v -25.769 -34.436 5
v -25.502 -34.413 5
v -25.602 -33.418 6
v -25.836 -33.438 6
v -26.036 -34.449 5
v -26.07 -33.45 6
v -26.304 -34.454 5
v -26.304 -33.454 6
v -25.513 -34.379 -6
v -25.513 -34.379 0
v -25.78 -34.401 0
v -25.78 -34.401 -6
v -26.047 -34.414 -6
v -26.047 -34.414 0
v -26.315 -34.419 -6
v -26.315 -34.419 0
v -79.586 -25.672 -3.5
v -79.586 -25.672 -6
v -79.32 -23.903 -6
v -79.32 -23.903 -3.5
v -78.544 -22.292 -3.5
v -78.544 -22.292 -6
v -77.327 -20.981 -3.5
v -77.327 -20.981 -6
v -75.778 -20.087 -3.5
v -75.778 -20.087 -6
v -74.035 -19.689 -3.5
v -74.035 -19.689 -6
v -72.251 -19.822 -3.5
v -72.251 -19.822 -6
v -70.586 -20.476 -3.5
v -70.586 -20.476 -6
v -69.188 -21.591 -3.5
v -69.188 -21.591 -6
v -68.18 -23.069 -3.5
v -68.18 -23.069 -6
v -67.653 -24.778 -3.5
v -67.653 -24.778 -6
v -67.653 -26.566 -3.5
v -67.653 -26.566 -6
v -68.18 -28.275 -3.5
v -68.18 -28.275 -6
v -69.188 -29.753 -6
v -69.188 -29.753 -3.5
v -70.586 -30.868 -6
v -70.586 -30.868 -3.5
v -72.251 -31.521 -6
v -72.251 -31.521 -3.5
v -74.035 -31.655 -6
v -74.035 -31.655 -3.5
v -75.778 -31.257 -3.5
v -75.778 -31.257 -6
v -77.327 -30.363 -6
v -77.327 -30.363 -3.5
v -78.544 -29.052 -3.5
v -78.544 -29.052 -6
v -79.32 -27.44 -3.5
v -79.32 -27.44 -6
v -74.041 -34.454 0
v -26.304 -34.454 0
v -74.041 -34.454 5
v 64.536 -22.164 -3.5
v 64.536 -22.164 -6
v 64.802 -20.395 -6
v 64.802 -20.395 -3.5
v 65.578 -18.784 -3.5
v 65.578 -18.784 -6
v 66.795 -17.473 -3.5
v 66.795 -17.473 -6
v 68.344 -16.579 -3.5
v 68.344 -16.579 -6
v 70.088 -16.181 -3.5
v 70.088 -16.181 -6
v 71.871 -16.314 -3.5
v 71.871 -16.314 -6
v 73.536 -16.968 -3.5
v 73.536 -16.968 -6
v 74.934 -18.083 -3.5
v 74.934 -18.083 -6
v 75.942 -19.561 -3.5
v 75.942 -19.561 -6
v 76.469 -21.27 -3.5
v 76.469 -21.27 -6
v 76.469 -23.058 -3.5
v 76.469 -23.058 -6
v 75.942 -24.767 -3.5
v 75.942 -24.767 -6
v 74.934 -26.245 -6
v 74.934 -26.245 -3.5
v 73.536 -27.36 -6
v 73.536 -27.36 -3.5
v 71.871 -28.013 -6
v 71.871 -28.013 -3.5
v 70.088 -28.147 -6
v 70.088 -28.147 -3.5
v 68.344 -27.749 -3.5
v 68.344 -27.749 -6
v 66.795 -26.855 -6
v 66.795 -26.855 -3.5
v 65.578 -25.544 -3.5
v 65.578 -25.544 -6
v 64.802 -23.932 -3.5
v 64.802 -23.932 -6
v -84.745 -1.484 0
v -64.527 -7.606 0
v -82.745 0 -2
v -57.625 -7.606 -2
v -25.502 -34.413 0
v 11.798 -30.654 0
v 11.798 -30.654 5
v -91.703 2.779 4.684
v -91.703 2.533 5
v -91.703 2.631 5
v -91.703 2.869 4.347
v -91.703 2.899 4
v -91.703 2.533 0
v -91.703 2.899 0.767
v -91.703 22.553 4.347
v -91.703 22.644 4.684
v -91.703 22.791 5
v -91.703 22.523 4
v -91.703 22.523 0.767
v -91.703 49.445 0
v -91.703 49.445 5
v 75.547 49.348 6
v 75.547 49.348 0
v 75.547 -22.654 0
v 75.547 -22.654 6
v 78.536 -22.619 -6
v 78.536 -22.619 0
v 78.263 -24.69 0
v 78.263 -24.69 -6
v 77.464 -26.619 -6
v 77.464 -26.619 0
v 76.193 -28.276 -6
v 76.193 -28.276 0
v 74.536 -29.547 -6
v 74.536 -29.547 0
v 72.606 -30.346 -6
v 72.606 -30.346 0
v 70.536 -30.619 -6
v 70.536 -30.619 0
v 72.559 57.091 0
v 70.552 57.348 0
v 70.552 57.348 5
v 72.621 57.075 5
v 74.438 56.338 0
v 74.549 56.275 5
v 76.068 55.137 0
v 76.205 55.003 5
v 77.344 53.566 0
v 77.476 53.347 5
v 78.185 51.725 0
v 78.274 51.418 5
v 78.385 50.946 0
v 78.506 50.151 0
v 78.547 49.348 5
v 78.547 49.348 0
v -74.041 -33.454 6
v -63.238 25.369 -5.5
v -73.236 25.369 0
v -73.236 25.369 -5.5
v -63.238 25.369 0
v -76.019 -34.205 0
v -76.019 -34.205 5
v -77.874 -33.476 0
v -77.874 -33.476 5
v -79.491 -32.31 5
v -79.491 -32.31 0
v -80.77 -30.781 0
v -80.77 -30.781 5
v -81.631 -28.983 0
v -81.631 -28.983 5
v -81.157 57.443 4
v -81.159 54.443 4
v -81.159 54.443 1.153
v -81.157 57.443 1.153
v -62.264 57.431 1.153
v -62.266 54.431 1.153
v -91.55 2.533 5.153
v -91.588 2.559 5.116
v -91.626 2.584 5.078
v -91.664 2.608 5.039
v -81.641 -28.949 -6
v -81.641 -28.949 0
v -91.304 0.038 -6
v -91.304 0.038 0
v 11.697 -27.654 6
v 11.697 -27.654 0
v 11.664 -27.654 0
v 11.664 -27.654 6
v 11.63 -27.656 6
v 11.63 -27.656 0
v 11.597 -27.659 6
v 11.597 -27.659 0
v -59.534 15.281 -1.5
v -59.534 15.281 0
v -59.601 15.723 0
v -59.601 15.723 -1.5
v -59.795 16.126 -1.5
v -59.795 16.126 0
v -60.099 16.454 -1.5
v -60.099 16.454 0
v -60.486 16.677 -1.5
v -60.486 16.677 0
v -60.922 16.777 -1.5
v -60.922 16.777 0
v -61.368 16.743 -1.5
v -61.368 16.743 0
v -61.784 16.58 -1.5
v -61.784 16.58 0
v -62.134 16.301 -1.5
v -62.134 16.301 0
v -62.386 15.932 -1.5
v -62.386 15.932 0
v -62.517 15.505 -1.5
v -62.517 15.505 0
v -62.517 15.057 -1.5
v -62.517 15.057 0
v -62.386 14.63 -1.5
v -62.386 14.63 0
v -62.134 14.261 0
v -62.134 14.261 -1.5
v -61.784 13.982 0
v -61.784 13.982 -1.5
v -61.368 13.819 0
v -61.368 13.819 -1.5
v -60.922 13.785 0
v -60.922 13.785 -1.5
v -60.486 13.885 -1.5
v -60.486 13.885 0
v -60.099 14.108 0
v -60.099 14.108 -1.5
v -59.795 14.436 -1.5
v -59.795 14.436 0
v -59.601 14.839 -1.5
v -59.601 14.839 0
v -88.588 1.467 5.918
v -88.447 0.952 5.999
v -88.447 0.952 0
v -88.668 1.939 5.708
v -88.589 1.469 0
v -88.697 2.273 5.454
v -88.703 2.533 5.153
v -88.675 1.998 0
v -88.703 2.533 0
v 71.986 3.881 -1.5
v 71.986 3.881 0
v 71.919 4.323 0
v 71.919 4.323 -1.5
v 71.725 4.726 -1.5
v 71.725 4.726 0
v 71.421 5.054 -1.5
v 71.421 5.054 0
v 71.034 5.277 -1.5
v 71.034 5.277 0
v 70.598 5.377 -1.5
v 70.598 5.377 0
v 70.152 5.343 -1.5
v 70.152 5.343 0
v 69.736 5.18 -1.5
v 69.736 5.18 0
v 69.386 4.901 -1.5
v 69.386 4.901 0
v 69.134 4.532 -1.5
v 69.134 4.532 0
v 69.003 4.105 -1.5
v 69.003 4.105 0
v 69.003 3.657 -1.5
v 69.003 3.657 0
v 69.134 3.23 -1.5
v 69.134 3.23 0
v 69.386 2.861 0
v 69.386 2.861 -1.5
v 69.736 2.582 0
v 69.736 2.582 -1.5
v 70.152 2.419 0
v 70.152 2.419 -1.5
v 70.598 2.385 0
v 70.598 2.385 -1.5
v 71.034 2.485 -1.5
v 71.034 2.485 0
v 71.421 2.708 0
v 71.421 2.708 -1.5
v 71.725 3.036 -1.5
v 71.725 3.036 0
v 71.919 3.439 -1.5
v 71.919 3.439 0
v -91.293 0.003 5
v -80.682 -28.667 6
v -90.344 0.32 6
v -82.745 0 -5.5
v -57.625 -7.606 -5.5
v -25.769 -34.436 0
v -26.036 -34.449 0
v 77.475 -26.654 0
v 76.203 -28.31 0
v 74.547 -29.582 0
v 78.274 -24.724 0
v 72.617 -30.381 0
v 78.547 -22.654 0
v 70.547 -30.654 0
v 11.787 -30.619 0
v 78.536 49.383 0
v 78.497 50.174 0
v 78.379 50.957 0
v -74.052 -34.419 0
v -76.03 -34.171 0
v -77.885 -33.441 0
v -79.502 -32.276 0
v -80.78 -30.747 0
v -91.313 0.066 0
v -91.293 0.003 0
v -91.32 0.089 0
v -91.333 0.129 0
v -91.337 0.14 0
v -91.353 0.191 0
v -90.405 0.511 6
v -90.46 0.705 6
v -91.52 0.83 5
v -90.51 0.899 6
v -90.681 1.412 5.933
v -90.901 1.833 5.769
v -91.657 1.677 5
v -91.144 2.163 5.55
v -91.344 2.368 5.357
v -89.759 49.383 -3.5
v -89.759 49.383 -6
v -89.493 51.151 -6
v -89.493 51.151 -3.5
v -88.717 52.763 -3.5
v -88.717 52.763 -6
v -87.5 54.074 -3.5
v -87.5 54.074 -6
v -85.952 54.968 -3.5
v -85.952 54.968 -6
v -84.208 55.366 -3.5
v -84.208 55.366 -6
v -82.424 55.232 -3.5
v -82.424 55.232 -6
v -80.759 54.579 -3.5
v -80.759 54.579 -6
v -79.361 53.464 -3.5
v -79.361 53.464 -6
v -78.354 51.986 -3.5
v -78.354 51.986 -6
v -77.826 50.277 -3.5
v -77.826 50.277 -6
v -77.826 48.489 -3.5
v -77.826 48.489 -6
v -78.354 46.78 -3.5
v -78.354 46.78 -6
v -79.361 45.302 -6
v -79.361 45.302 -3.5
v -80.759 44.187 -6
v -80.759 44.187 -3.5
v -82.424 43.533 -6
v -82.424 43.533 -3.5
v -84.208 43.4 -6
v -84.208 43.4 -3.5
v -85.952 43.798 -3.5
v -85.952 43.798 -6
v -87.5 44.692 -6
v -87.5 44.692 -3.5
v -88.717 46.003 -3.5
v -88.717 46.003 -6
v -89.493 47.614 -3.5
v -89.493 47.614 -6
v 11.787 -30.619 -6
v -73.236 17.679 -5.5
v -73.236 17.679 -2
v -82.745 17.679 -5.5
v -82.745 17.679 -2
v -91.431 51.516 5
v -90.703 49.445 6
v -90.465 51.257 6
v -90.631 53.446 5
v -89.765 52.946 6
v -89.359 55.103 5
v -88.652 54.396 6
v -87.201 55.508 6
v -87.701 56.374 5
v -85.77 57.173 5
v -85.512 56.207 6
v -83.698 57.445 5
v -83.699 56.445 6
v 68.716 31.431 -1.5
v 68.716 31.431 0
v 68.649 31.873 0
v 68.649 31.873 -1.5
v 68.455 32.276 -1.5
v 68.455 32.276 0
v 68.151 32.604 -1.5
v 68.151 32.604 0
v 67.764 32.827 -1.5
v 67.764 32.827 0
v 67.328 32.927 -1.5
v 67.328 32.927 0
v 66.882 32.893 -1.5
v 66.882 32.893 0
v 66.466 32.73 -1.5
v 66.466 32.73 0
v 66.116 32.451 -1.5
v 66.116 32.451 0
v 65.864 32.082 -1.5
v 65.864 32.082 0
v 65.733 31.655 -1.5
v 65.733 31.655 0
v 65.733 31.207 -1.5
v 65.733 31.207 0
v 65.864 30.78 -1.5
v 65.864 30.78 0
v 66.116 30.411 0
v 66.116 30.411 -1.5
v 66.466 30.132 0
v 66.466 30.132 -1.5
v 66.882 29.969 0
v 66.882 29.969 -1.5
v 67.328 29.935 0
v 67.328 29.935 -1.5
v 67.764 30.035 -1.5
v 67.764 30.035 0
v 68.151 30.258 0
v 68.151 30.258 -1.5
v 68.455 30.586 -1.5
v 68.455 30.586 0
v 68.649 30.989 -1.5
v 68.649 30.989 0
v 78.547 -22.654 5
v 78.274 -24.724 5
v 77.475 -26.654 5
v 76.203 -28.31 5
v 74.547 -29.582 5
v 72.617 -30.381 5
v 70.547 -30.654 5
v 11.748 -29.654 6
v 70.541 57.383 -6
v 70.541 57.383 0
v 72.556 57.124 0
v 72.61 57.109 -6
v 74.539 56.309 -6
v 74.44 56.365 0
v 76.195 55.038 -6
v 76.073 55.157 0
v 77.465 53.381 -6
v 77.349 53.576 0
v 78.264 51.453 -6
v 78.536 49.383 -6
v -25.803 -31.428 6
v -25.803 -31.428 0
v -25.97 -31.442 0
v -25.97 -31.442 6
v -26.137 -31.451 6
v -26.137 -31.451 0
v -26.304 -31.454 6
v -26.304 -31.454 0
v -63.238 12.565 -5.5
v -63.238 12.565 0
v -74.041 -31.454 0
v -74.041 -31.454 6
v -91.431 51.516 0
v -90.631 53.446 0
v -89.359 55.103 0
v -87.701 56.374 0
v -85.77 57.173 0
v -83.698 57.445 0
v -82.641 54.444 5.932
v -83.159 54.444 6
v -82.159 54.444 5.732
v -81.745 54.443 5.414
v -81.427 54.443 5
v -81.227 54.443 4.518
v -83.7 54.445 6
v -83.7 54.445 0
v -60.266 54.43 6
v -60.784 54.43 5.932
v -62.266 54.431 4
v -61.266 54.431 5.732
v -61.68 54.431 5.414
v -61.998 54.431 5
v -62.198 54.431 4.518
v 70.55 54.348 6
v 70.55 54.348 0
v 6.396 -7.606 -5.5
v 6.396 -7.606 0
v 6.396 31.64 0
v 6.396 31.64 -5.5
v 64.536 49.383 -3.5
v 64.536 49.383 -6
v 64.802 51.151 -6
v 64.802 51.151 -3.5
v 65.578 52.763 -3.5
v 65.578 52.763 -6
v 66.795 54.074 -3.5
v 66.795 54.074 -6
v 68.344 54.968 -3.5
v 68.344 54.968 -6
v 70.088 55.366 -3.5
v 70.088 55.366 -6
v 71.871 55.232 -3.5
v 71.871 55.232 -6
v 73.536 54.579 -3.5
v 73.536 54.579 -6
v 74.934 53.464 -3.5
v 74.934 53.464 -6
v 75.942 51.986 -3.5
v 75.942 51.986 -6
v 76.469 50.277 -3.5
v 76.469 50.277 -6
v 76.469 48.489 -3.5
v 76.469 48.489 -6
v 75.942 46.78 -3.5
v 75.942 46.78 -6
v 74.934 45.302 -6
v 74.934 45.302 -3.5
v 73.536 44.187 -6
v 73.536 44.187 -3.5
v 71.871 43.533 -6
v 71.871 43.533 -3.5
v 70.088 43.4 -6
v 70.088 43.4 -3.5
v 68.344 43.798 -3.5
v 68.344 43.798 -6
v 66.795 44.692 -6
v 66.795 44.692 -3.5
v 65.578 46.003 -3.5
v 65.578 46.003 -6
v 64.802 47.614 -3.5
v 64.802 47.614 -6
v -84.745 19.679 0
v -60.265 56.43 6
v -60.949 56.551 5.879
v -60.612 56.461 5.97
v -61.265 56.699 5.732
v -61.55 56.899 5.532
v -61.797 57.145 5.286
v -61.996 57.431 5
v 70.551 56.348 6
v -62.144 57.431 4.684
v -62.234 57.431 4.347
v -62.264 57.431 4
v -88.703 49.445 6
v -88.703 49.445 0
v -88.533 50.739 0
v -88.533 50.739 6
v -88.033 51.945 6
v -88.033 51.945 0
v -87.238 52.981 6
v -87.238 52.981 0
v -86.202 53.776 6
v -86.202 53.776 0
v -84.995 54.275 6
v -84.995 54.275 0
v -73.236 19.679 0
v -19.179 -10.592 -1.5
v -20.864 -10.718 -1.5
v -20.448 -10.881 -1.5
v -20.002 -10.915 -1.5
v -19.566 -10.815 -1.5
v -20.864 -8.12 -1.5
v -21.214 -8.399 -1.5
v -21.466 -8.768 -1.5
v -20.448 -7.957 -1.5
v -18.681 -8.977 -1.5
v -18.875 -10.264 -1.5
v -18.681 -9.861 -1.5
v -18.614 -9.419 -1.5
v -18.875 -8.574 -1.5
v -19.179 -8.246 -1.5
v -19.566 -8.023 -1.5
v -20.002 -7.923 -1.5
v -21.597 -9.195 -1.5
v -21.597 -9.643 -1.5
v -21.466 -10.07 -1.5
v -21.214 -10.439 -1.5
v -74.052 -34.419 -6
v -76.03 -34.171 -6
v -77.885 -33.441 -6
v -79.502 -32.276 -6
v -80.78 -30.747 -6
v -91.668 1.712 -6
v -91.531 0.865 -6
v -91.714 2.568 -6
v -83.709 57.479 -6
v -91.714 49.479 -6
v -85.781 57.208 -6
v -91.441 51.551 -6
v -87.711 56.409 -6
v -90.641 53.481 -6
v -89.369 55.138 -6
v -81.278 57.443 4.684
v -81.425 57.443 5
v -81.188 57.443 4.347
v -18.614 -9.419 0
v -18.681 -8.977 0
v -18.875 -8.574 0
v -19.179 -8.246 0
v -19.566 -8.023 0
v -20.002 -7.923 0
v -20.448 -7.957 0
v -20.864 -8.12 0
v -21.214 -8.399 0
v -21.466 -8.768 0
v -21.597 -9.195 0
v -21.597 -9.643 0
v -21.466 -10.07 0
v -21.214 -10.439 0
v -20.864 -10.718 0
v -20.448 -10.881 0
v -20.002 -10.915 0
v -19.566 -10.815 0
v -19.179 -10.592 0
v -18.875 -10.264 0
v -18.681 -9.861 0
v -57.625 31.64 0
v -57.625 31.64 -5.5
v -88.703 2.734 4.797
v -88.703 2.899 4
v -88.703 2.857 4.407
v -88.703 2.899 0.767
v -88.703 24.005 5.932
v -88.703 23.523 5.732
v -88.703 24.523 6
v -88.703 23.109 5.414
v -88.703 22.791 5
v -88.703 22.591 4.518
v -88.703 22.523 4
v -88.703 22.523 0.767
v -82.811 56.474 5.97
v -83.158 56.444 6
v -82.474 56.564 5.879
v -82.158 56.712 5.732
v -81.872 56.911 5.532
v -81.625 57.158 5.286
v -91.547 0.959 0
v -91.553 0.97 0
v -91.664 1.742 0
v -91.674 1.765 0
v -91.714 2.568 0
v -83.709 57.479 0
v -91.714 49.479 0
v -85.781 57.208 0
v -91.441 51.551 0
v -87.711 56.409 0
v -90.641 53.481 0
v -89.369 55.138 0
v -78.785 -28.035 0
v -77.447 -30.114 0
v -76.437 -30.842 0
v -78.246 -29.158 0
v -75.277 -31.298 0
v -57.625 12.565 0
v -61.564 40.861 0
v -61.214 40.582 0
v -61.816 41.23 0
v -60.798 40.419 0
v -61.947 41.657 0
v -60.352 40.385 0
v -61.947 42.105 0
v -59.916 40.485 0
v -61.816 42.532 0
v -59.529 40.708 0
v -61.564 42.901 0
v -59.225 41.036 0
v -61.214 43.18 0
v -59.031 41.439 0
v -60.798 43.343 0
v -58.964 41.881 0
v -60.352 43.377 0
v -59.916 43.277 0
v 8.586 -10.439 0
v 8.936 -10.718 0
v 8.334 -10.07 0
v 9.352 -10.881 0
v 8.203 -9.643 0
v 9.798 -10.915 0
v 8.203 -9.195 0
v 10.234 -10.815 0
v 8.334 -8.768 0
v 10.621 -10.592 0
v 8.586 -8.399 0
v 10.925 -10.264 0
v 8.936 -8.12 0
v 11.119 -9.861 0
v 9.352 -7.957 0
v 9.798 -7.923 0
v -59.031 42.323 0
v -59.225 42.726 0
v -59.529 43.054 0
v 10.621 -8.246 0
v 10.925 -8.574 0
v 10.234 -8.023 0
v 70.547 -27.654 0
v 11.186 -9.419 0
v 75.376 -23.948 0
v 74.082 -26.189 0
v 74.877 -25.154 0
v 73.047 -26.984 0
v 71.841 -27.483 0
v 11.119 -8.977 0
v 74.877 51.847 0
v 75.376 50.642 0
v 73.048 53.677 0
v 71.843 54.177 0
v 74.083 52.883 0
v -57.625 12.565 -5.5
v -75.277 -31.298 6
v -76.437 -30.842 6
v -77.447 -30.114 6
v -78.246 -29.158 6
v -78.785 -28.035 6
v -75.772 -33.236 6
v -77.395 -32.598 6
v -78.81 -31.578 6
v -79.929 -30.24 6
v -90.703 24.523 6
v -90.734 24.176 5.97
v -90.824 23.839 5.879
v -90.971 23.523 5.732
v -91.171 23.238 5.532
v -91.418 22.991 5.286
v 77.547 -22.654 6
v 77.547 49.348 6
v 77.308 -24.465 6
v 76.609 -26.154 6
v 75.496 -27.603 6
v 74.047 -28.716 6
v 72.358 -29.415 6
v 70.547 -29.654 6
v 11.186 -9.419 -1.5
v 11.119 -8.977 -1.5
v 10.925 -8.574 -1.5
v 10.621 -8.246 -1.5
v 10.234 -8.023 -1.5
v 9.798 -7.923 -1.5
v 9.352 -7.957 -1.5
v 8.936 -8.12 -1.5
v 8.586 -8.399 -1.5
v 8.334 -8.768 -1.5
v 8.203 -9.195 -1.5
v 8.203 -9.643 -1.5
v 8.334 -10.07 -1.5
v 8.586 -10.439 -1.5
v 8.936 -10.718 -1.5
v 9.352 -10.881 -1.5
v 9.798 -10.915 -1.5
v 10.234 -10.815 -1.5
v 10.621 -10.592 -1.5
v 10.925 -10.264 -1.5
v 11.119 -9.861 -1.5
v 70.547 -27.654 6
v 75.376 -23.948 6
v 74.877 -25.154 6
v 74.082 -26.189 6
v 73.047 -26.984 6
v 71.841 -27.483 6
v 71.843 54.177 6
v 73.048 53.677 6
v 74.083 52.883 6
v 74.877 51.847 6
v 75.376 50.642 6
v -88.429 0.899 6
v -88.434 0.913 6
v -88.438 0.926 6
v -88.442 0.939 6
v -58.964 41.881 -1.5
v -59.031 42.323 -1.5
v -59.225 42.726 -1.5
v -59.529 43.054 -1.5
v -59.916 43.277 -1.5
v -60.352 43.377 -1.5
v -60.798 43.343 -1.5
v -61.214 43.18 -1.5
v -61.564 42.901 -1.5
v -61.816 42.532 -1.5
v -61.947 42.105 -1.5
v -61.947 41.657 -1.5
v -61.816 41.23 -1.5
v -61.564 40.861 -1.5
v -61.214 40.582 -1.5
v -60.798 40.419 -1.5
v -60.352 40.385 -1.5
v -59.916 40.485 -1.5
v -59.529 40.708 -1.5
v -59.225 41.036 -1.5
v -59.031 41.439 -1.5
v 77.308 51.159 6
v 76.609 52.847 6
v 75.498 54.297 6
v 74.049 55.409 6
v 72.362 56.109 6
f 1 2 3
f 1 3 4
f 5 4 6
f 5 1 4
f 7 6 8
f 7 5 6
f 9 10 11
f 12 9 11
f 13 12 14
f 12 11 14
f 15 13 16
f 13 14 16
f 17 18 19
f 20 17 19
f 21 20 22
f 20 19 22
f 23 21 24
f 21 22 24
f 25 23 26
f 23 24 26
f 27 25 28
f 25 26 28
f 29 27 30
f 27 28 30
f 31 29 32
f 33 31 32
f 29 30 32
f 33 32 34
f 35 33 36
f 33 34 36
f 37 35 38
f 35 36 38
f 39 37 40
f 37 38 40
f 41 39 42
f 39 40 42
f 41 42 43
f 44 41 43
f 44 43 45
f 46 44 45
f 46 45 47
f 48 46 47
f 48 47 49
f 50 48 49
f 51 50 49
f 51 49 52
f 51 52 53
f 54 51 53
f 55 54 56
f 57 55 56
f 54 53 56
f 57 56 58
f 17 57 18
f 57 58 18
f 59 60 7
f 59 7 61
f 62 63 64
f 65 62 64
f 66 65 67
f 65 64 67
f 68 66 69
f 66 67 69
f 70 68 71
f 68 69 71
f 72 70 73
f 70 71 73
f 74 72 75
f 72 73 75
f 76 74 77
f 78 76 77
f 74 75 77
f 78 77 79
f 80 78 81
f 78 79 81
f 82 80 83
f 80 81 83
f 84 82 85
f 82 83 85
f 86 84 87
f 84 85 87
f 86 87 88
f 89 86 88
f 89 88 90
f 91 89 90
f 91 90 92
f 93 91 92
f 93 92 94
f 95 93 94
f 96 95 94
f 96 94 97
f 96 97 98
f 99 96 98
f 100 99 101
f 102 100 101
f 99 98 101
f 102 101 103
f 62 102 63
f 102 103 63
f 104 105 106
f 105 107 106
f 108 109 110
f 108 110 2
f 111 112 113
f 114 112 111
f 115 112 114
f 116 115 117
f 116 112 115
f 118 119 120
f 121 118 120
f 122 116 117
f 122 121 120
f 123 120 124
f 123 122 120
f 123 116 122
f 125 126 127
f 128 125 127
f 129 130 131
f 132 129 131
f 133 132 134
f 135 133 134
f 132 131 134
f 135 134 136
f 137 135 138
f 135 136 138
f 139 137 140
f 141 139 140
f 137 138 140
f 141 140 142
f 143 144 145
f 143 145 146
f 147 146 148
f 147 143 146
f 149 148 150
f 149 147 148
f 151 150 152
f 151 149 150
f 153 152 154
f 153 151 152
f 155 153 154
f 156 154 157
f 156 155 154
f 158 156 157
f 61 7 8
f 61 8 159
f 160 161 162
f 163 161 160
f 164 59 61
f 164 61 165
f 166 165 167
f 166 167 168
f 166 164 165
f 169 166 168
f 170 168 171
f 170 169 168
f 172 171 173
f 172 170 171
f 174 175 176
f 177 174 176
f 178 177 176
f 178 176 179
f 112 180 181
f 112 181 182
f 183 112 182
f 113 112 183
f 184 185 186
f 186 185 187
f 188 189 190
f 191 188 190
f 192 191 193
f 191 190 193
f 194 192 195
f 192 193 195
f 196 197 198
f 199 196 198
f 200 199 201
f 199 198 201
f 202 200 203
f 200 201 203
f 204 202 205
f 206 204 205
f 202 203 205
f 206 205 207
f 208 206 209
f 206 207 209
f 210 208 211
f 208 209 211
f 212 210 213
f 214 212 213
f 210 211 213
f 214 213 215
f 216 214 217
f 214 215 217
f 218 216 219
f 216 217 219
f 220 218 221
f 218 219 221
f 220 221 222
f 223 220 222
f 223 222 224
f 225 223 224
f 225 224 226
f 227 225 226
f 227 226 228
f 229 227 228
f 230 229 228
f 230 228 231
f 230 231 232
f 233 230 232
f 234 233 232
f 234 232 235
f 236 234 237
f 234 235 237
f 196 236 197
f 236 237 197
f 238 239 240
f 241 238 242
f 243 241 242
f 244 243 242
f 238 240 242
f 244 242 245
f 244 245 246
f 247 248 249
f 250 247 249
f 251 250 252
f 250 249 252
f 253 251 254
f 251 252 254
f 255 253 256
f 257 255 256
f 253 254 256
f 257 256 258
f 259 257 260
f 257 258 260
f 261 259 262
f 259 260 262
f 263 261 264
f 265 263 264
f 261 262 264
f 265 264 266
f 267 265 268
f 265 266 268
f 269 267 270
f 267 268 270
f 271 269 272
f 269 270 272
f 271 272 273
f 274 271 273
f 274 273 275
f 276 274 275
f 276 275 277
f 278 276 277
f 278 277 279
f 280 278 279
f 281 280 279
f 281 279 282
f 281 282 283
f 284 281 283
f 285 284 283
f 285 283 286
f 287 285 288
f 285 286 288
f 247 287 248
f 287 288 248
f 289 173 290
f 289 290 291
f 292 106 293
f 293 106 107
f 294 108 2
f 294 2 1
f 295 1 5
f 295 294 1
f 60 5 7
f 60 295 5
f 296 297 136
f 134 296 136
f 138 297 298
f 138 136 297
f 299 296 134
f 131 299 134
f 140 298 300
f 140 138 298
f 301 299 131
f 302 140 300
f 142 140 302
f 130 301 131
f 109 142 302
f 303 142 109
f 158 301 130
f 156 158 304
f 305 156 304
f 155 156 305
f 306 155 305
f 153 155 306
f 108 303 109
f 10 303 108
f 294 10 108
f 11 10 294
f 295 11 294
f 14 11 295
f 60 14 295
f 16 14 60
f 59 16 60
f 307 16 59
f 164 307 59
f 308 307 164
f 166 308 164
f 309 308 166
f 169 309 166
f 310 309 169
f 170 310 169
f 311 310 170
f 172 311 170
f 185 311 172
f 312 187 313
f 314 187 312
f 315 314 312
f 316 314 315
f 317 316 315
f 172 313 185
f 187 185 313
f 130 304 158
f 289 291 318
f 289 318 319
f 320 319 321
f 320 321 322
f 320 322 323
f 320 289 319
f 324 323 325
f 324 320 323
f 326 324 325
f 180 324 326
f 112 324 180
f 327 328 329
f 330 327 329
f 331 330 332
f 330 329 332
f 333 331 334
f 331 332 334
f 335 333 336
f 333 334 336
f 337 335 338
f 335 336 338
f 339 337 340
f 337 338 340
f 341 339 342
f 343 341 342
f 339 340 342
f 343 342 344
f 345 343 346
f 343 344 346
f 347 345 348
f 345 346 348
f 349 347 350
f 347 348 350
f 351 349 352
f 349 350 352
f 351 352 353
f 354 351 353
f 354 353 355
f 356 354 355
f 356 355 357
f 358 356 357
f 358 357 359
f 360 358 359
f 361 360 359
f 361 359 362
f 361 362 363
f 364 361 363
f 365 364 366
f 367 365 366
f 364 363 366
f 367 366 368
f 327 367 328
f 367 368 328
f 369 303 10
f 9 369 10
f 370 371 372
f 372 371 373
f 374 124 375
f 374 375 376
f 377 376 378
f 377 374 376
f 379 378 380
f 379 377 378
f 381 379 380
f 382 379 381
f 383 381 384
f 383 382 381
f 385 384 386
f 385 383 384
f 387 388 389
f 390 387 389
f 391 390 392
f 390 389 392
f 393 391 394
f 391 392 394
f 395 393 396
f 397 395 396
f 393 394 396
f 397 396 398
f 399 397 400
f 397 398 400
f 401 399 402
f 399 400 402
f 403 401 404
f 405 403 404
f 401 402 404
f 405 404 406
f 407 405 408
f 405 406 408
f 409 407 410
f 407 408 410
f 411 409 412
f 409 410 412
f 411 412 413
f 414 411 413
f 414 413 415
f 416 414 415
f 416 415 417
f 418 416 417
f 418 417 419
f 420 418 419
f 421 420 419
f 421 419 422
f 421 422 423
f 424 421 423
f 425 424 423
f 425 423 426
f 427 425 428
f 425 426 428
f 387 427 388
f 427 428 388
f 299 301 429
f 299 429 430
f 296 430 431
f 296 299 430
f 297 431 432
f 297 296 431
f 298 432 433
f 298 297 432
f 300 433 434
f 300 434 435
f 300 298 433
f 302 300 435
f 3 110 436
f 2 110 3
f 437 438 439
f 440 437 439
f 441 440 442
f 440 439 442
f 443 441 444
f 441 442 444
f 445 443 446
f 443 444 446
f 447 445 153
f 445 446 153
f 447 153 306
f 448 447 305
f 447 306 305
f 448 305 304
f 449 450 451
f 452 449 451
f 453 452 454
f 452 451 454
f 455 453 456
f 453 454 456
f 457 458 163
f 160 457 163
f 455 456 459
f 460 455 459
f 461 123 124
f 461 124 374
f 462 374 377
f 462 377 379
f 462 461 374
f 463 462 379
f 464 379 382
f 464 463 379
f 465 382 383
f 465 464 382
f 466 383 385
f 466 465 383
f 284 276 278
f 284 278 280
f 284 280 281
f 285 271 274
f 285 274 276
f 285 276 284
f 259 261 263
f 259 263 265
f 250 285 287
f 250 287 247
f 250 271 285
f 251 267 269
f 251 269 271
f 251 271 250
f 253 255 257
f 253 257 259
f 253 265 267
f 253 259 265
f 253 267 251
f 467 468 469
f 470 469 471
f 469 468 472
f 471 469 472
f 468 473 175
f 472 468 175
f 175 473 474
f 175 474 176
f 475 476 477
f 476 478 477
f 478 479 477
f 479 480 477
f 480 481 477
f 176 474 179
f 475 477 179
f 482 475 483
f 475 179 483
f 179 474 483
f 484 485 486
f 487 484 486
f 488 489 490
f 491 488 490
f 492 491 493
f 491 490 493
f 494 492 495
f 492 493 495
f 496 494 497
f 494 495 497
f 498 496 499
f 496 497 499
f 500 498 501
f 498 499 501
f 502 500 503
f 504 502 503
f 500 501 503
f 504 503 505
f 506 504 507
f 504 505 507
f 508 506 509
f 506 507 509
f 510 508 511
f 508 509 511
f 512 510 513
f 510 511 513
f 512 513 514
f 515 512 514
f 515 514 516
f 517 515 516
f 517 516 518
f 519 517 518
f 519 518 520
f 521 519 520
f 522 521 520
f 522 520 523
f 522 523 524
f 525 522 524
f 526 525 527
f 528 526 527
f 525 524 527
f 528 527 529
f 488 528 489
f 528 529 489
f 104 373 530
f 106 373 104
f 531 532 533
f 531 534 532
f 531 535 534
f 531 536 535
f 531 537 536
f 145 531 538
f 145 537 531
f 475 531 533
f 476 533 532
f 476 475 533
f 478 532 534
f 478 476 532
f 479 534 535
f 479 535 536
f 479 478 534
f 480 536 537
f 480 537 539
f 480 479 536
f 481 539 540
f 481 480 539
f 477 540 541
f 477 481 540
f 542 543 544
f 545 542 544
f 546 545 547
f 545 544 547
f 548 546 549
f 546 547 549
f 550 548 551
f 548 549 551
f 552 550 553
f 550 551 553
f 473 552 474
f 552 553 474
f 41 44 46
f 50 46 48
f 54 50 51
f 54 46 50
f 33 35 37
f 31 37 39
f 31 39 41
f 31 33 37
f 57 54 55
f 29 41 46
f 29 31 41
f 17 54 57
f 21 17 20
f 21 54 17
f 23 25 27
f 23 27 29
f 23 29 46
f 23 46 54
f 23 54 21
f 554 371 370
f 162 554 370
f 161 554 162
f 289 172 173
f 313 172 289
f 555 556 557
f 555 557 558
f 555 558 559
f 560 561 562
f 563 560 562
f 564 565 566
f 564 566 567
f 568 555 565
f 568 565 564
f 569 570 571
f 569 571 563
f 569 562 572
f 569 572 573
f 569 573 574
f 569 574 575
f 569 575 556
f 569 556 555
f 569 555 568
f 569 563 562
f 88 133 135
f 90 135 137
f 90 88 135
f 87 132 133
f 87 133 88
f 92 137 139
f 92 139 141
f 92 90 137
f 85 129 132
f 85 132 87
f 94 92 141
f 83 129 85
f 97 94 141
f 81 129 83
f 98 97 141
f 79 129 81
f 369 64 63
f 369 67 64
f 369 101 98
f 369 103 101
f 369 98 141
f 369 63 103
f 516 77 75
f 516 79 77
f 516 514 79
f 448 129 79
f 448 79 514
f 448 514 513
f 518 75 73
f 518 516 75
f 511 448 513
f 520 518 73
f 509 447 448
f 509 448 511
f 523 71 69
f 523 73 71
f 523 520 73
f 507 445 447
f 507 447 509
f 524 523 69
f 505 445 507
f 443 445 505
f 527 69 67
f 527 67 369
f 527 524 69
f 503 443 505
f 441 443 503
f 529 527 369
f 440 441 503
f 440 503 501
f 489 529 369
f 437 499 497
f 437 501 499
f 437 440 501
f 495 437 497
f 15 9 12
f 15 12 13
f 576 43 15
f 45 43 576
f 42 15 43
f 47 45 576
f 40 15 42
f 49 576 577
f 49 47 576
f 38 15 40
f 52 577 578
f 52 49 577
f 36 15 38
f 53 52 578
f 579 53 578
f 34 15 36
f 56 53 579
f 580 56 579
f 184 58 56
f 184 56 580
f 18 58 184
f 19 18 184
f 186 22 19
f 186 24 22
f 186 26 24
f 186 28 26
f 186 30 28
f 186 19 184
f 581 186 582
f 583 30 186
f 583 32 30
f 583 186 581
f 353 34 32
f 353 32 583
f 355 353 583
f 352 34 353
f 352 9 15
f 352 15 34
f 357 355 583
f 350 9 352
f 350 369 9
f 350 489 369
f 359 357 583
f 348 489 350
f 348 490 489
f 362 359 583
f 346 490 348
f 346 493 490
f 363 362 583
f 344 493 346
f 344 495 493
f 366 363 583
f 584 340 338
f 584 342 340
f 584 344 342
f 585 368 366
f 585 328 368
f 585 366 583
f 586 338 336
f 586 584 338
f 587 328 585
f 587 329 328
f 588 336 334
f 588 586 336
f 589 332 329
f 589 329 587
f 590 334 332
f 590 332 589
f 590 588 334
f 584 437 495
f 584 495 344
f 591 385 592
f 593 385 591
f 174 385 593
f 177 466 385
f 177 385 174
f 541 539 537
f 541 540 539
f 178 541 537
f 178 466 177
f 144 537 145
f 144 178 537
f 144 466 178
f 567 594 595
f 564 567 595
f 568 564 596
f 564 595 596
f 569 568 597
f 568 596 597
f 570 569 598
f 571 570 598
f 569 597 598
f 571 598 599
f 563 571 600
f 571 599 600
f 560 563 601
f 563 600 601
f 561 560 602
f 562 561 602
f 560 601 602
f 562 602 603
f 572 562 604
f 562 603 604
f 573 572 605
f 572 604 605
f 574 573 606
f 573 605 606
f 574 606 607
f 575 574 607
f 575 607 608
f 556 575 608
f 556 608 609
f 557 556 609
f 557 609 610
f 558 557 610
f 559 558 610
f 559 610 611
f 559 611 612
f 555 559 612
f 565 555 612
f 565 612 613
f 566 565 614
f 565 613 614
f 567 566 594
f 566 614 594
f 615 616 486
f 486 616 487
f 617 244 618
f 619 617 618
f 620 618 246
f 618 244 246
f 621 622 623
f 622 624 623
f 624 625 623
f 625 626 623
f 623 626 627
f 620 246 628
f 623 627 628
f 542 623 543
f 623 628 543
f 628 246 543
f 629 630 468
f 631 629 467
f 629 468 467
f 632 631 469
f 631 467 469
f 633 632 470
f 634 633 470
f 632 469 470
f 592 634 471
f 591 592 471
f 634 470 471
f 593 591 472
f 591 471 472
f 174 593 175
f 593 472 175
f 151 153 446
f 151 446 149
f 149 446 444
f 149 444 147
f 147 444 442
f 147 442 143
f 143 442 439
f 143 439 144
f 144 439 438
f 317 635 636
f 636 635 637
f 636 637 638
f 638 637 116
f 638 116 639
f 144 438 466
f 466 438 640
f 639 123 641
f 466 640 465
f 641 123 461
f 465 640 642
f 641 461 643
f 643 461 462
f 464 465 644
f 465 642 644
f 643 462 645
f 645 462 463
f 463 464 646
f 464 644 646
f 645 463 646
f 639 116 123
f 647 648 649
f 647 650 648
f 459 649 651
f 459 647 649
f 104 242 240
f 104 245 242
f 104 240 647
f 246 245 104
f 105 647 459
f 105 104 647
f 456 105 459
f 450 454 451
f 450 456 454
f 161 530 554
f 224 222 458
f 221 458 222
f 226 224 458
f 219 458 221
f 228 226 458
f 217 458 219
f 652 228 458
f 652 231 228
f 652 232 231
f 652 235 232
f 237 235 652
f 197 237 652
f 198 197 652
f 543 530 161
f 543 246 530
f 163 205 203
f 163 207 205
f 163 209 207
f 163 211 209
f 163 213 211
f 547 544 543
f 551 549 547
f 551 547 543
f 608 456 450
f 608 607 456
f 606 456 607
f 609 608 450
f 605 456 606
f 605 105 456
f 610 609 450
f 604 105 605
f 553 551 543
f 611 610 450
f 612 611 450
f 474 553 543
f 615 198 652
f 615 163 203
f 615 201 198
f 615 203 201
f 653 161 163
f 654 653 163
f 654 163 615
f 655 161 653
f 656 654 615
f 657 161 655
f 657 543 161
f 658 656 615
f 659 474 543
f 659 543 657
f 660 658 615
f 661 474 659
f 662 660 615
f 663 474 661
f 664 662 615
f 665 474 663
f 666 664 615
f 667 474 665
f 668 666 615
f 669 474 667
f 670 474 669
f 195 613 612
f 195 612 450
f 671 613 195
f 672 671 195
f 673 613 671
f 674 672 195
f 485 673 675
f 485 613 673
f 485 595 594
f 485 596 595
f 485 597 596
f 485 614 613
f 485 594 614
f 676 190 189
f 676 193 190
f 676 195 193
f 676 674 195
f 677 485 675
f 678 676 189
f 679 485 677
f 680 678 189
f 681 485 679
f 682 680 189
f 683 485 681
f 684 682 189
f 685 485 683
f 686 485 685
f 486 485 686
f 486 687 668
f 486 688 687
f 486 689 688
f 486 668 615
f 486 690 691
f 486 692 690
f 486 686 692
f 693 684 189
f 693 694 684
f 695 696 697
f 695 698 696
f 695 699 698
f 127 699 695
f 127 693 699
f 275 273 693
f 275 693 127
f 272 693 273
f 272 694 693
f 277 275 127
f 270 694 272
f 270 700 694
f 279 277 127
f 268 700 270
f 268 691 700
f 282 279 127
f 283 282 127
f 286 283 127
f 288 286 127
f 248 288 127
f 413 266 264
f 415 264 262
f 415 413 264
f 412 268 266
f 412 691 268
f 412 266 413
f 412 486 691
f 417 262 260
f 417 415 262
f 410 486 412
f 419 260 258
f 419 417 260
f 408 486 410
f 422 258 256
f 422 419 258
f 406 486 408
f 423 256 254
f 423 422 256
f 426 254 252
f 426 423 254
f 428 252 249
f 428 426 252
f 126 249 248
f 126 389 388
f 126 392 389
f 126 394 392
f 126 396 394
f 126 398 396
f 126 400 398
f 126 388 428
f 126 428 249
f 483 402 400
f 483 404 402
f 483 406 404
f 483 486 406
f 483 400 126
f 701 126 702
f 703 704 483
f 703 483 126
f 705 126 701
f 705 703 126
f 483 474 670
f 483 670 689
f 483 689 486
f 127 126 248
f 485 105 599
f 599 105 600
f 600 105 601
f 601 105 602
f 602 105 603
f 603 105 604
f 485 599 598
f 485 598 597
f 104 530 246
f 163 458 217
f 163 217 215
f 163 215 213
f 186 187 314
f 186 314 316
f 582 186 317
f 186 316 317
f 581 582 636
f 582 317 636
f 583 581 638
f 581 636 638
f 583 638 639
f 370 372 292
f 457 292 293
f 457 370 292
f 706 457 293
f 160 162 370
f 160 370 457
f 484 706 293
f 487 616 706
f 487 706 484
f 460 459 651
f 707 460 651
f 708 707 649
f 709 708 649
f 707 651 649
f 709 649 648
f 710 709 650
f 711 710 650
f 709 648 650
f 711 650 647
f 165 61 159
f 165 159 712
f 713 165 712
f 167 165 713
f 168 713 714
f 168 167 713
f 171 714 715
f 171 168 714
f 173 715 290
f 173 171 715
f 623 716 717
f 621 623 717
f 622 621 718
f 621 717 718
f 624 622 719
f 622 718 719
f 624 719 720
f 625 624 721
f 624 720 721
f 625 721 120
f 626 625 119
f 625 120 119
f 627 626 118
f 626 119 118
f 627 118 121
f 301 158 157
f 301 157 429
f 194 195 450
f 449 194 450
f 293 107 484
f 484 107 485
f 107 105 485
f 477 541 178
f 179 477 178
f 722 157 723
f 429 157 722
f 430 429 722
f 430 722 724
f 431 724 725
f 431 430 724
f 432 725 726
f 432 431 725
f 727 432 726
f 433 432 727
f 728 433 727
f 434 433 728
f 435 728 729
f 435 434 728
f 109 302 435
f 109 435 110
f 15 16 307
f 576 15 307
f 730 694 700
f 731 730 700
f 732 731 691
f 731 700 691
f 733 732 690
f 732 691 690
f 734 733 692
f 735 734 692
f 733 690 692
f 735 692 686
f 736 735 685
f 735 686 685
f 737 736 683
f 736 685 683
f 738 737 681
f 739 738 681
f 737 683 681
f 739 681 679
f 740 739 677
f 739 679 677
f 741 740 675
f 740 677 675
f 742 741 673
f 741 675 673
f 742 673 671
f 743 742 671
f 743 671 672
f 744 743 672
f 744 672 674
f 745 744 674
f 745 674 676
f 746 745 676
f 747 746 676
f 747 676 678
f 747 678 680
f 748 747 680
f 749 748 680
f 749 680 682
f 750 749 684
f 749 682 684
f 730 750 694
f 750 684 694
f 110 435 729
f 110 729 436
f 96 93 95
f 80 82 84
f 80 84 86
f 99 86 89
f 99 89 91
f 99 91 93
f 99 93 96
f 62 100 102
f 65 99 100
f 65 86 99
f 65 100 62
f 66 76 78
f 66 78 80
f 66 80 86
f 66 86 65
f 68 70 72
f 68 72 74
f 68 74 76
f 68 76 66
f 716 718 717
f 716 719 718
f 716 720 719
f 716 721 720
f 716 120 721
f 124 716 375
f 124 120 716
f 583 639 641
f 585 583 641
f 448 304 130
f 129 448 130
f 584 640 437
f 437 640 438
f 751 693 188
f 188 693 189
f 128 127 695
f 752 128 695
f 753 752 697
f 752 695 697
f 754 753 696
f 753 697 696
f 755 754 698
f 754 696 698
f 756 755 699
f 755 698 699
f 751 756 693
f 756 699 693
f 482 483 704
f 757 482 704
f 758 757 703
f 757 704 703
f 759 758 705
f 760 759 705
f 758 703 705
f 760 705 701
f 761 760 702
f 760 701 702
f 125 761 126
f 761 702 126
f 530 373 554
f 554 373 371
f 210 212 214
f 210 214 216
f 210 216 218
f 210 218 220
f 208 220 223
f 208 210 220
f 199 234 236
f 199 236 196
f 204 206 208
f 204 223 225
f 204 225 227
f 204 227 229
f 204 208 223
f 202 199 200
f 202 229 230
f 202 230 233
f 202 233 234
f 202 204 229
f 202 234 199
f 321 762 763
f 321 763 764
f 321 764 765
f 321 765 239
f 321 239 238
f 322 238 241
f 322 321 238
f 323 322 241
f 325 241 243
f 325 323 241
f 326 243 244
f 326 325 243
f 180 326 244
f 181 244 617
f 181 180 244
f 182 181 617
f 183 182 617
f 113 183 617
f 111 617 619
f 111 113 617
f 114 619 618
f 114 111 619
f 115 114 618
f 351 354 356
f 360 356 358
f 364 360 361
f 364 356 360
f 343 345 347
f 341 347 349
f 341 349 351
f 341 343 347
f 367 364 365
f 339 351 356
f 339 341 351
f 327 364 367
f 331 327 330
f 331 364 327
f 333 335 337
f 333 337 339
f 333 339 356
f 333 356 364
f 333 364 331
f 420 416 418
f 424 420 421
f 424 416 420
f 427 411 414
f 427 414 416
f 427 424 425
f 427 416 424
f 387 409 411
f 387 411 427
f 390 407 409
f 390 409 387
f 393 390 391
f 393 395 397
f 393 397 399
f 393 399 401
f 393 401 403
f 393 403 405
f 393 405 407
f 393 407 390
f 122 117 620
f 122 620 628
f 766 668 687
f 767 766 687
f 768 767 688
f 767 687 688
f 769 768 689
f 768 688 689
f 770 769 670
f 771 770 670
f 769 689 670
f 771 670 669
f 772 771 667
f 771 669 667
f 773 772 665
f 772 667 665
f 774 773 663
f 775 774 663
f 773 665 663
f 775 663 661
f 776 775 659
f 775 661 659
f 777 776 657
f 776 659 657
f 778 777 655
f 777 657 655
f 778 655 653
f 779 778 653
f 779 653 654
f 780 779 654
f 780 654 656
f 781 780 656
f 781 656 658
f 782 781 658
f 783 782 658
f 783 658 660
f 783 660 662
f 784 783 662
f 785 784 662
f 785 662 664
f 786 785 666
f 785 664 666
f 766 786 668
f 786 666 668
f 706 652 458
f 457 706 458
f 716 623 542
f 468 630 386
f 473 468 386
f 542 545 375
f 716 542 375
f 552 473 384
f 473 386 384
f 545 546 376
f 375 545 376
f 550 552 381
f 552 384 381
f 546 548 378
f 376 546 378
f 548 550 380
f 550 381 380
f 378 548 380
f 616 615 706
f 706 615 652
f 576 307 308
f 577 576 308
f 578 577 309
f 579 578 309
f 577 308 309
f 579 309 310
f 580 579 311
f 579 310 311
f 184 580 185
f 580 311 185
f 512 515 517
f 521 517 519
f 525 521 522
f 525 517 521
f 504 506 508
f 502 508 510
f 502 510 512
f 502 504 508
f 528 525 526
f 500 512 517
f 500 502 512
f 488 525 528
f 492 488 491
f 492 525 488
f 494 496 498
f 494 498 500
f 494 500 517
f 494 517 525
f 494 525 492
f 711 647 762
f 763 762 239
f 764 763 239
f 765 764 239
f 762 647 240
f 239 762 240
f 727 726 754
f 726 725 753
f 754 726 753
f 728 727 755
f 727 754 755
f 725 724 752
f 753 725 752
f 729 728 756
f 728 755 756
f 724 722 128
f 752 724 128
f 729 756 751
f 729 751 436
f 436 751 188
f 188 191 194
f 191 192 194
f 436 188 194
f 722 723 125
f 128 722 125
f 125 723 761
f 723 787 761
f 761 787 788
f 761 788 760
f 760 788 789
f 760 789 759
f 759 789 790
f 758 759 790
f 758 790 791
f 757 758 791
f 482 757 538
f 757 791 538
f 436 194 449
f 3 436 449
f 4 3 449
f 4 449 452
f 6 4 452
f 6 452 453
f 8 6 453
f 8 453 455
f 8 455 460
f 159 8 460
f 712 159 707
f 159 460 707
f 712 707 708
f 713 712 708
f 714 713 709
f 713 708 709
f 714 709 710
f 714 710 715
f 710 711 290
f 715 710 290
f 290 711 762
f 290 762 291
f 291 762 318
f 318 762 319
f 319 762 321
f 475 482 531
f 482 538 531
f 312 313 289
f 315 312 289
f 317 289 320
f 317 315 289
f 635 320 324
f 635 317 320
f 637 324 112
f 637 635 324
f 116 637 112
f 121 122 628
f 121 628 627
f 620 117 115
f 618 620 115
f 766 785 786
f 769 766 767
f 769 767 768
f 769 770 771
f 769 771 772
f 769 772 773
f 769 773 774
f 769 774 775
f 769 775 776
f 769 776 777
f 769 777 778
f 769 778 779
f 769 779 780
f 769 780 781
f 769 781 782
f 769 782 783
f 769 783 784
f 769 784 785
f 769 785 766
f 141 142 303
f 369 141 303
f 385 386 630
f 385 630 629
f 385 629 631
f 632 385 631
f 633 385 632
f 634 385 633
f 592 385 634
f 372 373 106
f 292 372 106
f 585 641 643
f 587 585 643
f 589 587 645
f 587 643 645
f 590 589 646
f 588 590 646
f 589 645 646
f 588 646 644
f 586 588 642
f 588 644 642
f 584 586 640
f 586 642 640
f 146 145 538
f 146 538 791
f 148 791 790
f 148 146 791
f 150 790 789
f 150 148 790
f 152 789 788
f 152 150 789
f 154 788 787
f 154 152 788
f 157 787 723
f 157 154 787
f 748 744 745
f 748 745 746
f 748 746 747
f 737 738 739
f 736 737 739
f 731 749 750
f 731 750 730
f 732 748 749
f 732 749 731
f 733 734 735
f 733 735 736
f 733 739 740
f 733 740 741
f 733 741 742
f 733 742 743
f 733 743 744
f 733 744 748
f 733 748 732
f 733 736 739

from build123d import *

# Parameters (mm, degrees)
BOSS_EXTRUDE1_DEPTH = 6
SKETCH4_R           = 1
BOSS_EXTRUDE2_DEPTH = 6
SKETCH5_W           = 18.416924118
SKETCH5_H           = 14.207341462
SKETCH5_W_2         = 7.542168924
CUT_EXTRUDE2_DEPTH  = 5.5
BOSS_EXTRUDE3_START = -5.5
SKETCH6_R           = 1
BOSS_EXTRUDE3_DEPTH = 5.5
SKETCH7_R           = 1.5
CUT_EXTRUDE3_DEPTH  = 1.5
SKETCH8_R           = 6
CUT_EXTRUDE4_DEPTH  = 2.5
CHAMFER1_SIZE       = 1
SKETCH9_W           = 18.892930983
SKETCH9_H           = 5.861361118
CUT_EXTRUDE5_DEPTH  = 5
FILLET1_R           = 2
SKETCH10_W          = 6.781572577
SKETCH10_H          = 19.62380987
CUT_EXTRUDE6_DEPTH  = 5
FILLET2_R           = 2
SKETCH11_W          = 9.997758807
SKETCH11_H          = 15.961334235
CUT_EXTRUDE7_DEPTH  = 5.5
SKETCH12_W          = 64.020736218
SKETCH12_H          = 3.376126478
BOSS_EXTRUDE4_DEPTH = 5.5
CUT_EXTRUDE8_DEPTH  = 5.5
CHAMFER2_SIZE       = 2
CHAMFER3_SIZE       = 2
CHAMFER4_SIZE       = 2


with BuildPart() as part:
    # Sketch3 → Boss-Extrude1 (new body)
    with BuildSketch(Plane.XY):
        with BuildLine():
            Line((-83.698447841, 57.444573542), (70.551552159, 57.348317742))
            ThreePointArc((70.551552159, 57.348317742), (76.205179029, 55.0034083), (78.546560098, 49.348319285))
            Line((78.546560098, 49.348319285), (78.546560098, -22.653552215))
            ThreePointArc((78.546560098, -22.653552215), (76.203414347, -28.310406464), (70.546560098, -30.653552215))
            Line((70.546560098, -30.653552215), (11.797913198, -30.653552215))
            Line((11.797913198, -30.653552215), (-25.501951002, -34.413220215))
            ThreePointArc((-25.501951002, -34.413220215), (-25.902594791, -34.443462903), (-26.304251697, -34.453552282))
            Line((-26.304251697, -34.453552282), (-74.041162197, -34.453552282))
            ThreePointArc((-74.041162197, -34.453552282), (-78.718844372, -32.943489837), (-81.6306285, -28.983374648))
            Line((-81.6306285, -28.983374648), (-91.292906294, 0.003458516))
            ThreePointArc((-91.292906294, 0.003458516), (-91.600139587, 1.251822731), (-91.703439931, 2.53328071))
            Line((-91.703439931, 2.53328071), (-91.703439931, 49.44457511))
            ThreePointArc((-91.703439931, 49.44457511), (-89.358528934, 55.103194051), (-83.698447841, 57.444573542))
        make_face()
        with BuildLine():
            Line((-83.700319941, 54.444574123), (70.549680059, 54.348318323))
            ThreePointArc((70.549680059, 54.348318323), (74.083196904, 52.882749939), (75.546560095, 49.348319271))
            Line((75.546560095, 49.348319271), (75.546560095, -22.653552229))
            ThreePointArc((75.546560095, -22.653552229), (74.082093996, -26.189086124), (70.546560098, -27.653552212))
            Line((70.546560098, -27.653552212), (11.697371898, -27.653552212))
            ThreePointArc((11.697371898, -27.653552212), (11.64716478, -27.654813402), (11.597084303, -27.658593757))
            Line((11.597084303, -27.658593757), (-25.802813799, -31.428344747))
            ThreePointArc((-25.802813799, -31.428344747), (-26.053216149, -31.447246424), (-26.304251697, -31.453552285))
            Line((-26.304251697, -31.453552285), (-74.041162197, -31.453552285))
            ThreePointArc((-74.041162197, -31.453552285), (-76.964713558, -30.509763257), (-78.784578638, -28.034691263))
            Line((-78.784578638, -28.034691263), (-88.446856397, 0.952141815))
            ThreePointArc((-88.446856397, 0.952141815), (-88.638877211, 1.732369461), (-88.703439928, 2.53328071))
            Line((-88.703439928, 2.53328071), (-88.703439928, 49.44457511))
            ThreePointArc((-88.703439928, 49.44457511), (-87.237870579, 52.981211921), (-83.700319941, 54.444574123))
        make_face(mode=Mode.SUBTRACT)
    extrude(amount=BOSS_EXTRUDE1_DEPTH)

    # Sketch4 → Boss-Extrude2 (add)
    # profile 1 of 2: a face of its own
    with BuildSketch(Plane.XY):
        with BuildLine():
            Line((-83.709120873, 57.479155754), (70.540879127, 57.382899954))
            ThreePointArc((70.540879127, 57.382899954), (76.194505997, 55.037990512), (78.535887066, 49.382901497))
            Line((78.535887066, 49.382901497), (78.535887066, -22.618970003))
            ThreePointArc((78.535887066, -22.618970003), (76.192741315, -28.275824252), (70.535887066, -30.618970003))
            Line((70.535887066, -30.618970003), (11.787240166, -30.618970003))
            Line((11.787240166, -30.618970003), (-25.512624034, -34.378638003))
            ThreePointArc((-25.512624034, -34.378638003), (-25.913267823, -34.408880691), (-26.314924729, -34.41897007))
            Line((-26.314924729, -34.41897007), (-74.051835229, -34.41897007))
            ThreePointArc((-74.051835229, -34.41897007), (-78.729517404, -32.908907625), (-81.641301532, -28.948792436))
            Line((-81.641301532, -28.948792436), (-91.303579326, 0.038040728))
            ThreePointArc((-91.303579326, 0.038040728), (-91.610812619, 1.286404943), (-91.714112963, 2.567862922))
            Line((-91.714112963, 2.567862922), (-91.714112963, 49.479157322))
            ThreePointArc((-91.714112963, 49.479157322), (-89.369201966, 55.137776263), (-83.709120873, 57.479155754))
        make_face()
        with BuildLine():
            ThreePointArc((-83.710992973, 54.479156335), (-87.248543611, 53.015794133), (-88.71411296, 49.479157322))
            Line((-88.71411296, 49.479157322), (-88.71411296, 2.567862922))
            ThreePointArc((-88.71411296, 2.567862922), (-88.649550243, 1.766951673), (-88.457529429, 0.986724027))
            Line((-88.457529429, 0.986724027), (-78.79525167, -28.000109051))
            ThreePointArc((-78.79525167, -28.000109051), (-76.97538659, -30.475181045), (-74.051835229, -31.418970073))
            Line((-74.051835229, -31.418970073), (-26.314924729, -31.418970073))
            ThreePointArc((-26.314924729, -31.418970073), (-26.063889181, -31.412664212), (-25.813486831, -31.393762535))
            Line((-25.813486831, -31.393762535), (11.586411271, -27.624011544))
            ThreePointArc((11.586411271, -27.624011544), (11.636491748, -27.62023119), (11.686698866, -27.61897))
            Line((11.686698866, -27.61897), (70.535887066, -27.61897))
            ThreePointArc((70.535887066, -27.61897), (74.071420964, -26.154503912), (75.535887062, -22.618970017))
            Line((75.535887062, -22.618970017), (75.535887062, 49.382901483))
            ThreePointArc((75.535887062, 49.382901483), (74.072523872, 52.917332152), (70.539007027, 54.382900535))
            Line((70.539007027, 54.382900535), (-83.710992973, 54.479156335))
        make_face(mode=Mode.SUBTRACT)
    # profile 2 of 2: a face of its own
    with BuildSketch(Plane.XY):
        with BuildLine():
            Line((-83.710992973, 54.479156335), (70.539007027, 54.382900535))
            ThreePointArc((70.539007027, 54.382900535), (74.072523872, 52.917332152), (75.535887062, 49.382901483))
            Line((75.535887062, 49.382901483), (75.535887062, -22.618970017))
            ThreePointArc((75.535887062, -22.618970017), (74.071420964, -26.154503912), (70.535887066, -27.61897))
            Line((70.535887066, -27.61897), (11.686698866, -27.61897))
            ThreePointArc((11.686698866, -27.61897), (11.636491748, -27.62023119), (11.586411271, -27.624011544))
            Line((11.586411271, -27.624011544), (-25.813486831, -31.393762535))
            ThreePointArc((-25.813486831, -31.393762535), (-26.063889181, -31.412664212), (-26.314924729, -31.418970073))
            Line((-26.314924729, -31.418970073), (-74.051835229, -31.418970073))
            ThreePointArc((-74.051835229, -31.418970073), (-76.97538659, -30.475181045), (-78.79525167, -28.000109051))
            Line((-78.79525167, -28.000109051), (-88.457529429, 0.986724027))
            ThreePointArc((-88.457529429, 0.986724027), (-88.649550243, 1.766951673), (-88.71411296, 2.567862922))
            Line((-88.71411296, 2.567862922), (-88.71411296, 49.479157322))
            ThreePointArc((-88.71411296, 49.479157322), (-87.248543611, 53.015794133), (-83.710992973, 54.479156335))
        make_face()
        with Locations((67.215887037, 31.431029922)):
            Circle(SKETCH4_R, mode=Mode.SUBTRACT)
        with Locations((70.485887037, 3.881029922)):
            Circle(SKETCH4_R, mode=Mode.SUBTRACT)
        with Locations((9.685887037, -9.418970078)):
            Circle(SKETCH4_R, mode=Mode.SUBTRACT)
        with Locations((-20.114112963, -9.418970078)):
            Circle(SKETCH4_R, mode=Mode.SUBTRACT)
        with Locations((-61.034112963, 15.281029922)):
            Circle(SKETCH4_R, mode=Mode.SUBTRACT)
        with Locations((-60.464112963, 41.881029922)):
            Circle(SKETCH4_R, mode=Mode.SUBTRACT)
    extrude(amount=-BOSS_EXTRUDE2_DEPTH)

    # Sketch5 → Cut-Extrude2 (cut)
    with BuildSketch(Plane.XY):
        with Locations((-66.833428189, 5.461527447)):
            Rectangle(SKETCH5_W, SKETCH5_H)
        with Locations((-53.853881668, 5.461527447)):
            Rectangle(SKETCH5_W_2, SKETCH5_H)
        Polygon((6.395770088, 35.016305674), (-57.62496613, 35.016305674), (-57.62496613, 12.565198178), (-50.082797206, 12.565198178), (-50.082797206, -1.642143284), (-57.62496613, -1.642143284), (-57.62496613, -7.605718712), (6.395770088, -7.605718712), align=None)
    extrude(amount=-CUT_EXTRUDE2_DEPTH, mode=Mode.SUBTRACT)

    # Sketch6 → Boss-Extrude3 (add)
    with BuildSketch(Plane(origin=(0, 0, -6), x_dir=(-1, 0, 0), z_dir=(0, 0, -1)).offset(BOSS_EXTRUDE3_START)):
        with Locations(Location((-67.215887037, 31.431029922, 0), (0, 0, 180))):
            Circle(SKETCH6_R)
        with Locations(Location((-70.485887037, 3.881029922, 0), (0, 0, 180))):
            Circle(SKETCH6_R)
        with Locations(Location((-9.685887037, -9.418970078, 0), (0, 0, 180))):
            Circle(SKETCH6_R)
        with Locations(Location((20.114112963, -9.418970078, 0), (0, 0, 180))):
            Circle(SKETCH6_R)
        with Locations(Location((61.034112963, 15.281029922, 0), (0, 0, 180))):
            Circle(SKETCH6_R)
        with Locations(Location((60.464112963, 41.881029922, 0), (0, 0, 180))):
            Circle(SKETCH6_R)
    extrude(amount=BOSS_EXTRUDE3_DEPTH)

    # Sketch7 → Cut-Extrude3 (cut)
    with BuildSketch(Plane.XY):
        with Locations((-60.464112963, 41.881029922)):
            Circle(SKETCH7_R)
        with Locations((-61.034112963, 15.281029922)):
            Circle(SKETCH7_R)
        with Locations((-20.114112963, -9.418970078)):
            Circle(SKETCH7_R)
        with Locations((9.685887037, -9.418970078)):
            Circle(SKETCH7_R)
        with Locations((70.485887037, 3.881029922)):
            Circle(SKETCH7_R)
        with Locations((67.215887037, 31.431029922)):
            Circle(SKETCH7_R)
    extrude(amount=-CUT_EXTRUDE3_DEPTH, mode=Mode.SUBTRACT)

    # Sketch8 → Cut-Extrude4 (cut)
    with BuildSketch(Plane(origin=(0, 0, -6), x_dir=(-1, 0, 0), z_dir=(0, 0, -1))):
        with Locations((-70.535887037, 49.382901483)):
            Circle(SKETCH8_R)
        with Locations((-70.535887037, -22.163858729)):
            Circle(SKETCH8_R)
        with Locations((83.75945845, 49.382901483)):
            Circle(SKETCH8_R)
        with Locations((73.586300366, -25.671844276)):
            Circle(SKETCH8_R)
    extrude(amount=-CUT_EXTRUDE4_DEPTH, mode=Mode.SUBTRACT)

    # Chamfer1
    chamfer1_edges = [part.edges().sort_by_distance(p)[0] for p in [
        (-91.600139587, 1.251822731, 6),
        (-86.461767397, -14.489958066, 6),
        (-78.718844372, -32.943489837, 6),
        (-50.172706947, -34.453552282, 6),
        (-25.902594791, -34.443462903, 6),
        (-6.852018902, -32.533386215, 6),
        (41.172236648, -30.653552215, 6),
        (76.203414347, -28.310406464, 6),
        (78.546560098, 13.347383535, 6),
        (76.205179029, 55.0034083, 6),
        (-89.358528934, 55.103194051, 6),
        (-6.573447841, 57.396445642, 6),
        (-91.703439931, 25.98892791, 6),
    ]]
    chamfer(chamfer1_edges, length=CHAMFER1_SIZE)

    # Sketch9 → Cut-Extrude5 (cut)
    with BuildSketch(Plane(origin=(0.035814222, 57.392321299, 0), x_dir=(0.9999998052966842, -0.0006240245138326787, 0), z_dir=(0.0006240245138326787, 0.9999998052966842, 0))):
        with Locations((-71.746565454, -4.083255452)):
            Rectangle(SKETCH9_W, SKETCH9_H)
    extrude(amount=-CUT_EXTRUDE5_DEPTH, mode=Mode.SUBTRACT)

    # Fillet1
    fillet1_edges = [part.edges().sort_by_distance(p)[0] for p in [
        (-62.265521659, 55.431198477, 6),
        (-81.158448963, 55.442988129, 6),
    ]]
    fillet(fillet1_edges, radius=FILLET1_R)

    # Sketch10 → Cut-Extrude6 (cut)
    with BuildSketch(Plane.ZY.offset(91.703439931)):
        with Locations((4.158048933, 12.711198082)):
            Rectangle(SKETCH10_W, SKETCH10_H)
    extrude(amount=-CUT_EXTRUDE6_DEPTH, mode=Mode.SUBTRACT)

    # Fillet2
    fillet2_edges = [part.edges().sort_by_distance(p)[0] for p in [
        (-89.703439929, 2.899293147, 6),
        (-89.703439929, 22.523103017, 6),
    ]]
    fillet(fillet2_edges, radius=FILLET2_R)

    # Sketch11 → Cut-Extrude7 (cut)
    with BuildSketch(Plane.XY):
        with Locations((-68.236622408, 17.388678305)):
            Rectangle(SKETCH11_W, SKETCH11_H)
    extrude(amount=-CUT_EXTRUDE7_DEPTH, mode=Mode.SUBTRACT)

    # Sketch12 → Boss-Extrude4 (add)
    with BuildSketch(Plane.XY.offset(-5.5)):
        with Locations((-25.614598021, 33.328242435)):
            Rectangle(SKETCH12_W, SKETCH12_H)
    extrude(amount=BOSS_EXTRUDE4_DEPTH)

    # Sketch13 → Cut-Extrude8 (cut)
    with BuildSketch(Plane.XY):
        Polygon((-82.744925302, 17.678852462), (-82.744925302, 0), (-57.62496613, -7.605718712), (-57.62496613, -1.642143284), (-76.041890248, -1.642143284), (-76.041890248, 12.565198178), (-73.235501811, 12.565198178), (-73.235501811, 17.678852462), align=None)
    extrude(amount=-CUT_EXTRUDE8_DEPTH, mode=Mode.SUBTRACT)

    # Chamfer2
    chamfer2_edges = [part.edges().sort_by_distance(p)[0] for p in [
        (-82.744925302, 8.839426231, 0),
    ]]
    chamfer(chamfer2_edges, length=CHAMFER2_SIZE)

    # Chamfer3
    chamfer3_edges = [part.edges().sort_by_distance(p)[0] for p in [
        (-78.990213556, 17.678852462, 0),
    ]]
    chamfer(chamfer3_edges, length=CHAMFER3_SIZE)

    # Chamfer4
    chamfer4_edges = [part.edges().sort_by_distance(p)[0] for p in [
        (-71.184945716, -3.500083438, 0),
    ]]
    chamfer(chamfer4_edges, length=CHAMFER4_SIZE)


solid = part.part
